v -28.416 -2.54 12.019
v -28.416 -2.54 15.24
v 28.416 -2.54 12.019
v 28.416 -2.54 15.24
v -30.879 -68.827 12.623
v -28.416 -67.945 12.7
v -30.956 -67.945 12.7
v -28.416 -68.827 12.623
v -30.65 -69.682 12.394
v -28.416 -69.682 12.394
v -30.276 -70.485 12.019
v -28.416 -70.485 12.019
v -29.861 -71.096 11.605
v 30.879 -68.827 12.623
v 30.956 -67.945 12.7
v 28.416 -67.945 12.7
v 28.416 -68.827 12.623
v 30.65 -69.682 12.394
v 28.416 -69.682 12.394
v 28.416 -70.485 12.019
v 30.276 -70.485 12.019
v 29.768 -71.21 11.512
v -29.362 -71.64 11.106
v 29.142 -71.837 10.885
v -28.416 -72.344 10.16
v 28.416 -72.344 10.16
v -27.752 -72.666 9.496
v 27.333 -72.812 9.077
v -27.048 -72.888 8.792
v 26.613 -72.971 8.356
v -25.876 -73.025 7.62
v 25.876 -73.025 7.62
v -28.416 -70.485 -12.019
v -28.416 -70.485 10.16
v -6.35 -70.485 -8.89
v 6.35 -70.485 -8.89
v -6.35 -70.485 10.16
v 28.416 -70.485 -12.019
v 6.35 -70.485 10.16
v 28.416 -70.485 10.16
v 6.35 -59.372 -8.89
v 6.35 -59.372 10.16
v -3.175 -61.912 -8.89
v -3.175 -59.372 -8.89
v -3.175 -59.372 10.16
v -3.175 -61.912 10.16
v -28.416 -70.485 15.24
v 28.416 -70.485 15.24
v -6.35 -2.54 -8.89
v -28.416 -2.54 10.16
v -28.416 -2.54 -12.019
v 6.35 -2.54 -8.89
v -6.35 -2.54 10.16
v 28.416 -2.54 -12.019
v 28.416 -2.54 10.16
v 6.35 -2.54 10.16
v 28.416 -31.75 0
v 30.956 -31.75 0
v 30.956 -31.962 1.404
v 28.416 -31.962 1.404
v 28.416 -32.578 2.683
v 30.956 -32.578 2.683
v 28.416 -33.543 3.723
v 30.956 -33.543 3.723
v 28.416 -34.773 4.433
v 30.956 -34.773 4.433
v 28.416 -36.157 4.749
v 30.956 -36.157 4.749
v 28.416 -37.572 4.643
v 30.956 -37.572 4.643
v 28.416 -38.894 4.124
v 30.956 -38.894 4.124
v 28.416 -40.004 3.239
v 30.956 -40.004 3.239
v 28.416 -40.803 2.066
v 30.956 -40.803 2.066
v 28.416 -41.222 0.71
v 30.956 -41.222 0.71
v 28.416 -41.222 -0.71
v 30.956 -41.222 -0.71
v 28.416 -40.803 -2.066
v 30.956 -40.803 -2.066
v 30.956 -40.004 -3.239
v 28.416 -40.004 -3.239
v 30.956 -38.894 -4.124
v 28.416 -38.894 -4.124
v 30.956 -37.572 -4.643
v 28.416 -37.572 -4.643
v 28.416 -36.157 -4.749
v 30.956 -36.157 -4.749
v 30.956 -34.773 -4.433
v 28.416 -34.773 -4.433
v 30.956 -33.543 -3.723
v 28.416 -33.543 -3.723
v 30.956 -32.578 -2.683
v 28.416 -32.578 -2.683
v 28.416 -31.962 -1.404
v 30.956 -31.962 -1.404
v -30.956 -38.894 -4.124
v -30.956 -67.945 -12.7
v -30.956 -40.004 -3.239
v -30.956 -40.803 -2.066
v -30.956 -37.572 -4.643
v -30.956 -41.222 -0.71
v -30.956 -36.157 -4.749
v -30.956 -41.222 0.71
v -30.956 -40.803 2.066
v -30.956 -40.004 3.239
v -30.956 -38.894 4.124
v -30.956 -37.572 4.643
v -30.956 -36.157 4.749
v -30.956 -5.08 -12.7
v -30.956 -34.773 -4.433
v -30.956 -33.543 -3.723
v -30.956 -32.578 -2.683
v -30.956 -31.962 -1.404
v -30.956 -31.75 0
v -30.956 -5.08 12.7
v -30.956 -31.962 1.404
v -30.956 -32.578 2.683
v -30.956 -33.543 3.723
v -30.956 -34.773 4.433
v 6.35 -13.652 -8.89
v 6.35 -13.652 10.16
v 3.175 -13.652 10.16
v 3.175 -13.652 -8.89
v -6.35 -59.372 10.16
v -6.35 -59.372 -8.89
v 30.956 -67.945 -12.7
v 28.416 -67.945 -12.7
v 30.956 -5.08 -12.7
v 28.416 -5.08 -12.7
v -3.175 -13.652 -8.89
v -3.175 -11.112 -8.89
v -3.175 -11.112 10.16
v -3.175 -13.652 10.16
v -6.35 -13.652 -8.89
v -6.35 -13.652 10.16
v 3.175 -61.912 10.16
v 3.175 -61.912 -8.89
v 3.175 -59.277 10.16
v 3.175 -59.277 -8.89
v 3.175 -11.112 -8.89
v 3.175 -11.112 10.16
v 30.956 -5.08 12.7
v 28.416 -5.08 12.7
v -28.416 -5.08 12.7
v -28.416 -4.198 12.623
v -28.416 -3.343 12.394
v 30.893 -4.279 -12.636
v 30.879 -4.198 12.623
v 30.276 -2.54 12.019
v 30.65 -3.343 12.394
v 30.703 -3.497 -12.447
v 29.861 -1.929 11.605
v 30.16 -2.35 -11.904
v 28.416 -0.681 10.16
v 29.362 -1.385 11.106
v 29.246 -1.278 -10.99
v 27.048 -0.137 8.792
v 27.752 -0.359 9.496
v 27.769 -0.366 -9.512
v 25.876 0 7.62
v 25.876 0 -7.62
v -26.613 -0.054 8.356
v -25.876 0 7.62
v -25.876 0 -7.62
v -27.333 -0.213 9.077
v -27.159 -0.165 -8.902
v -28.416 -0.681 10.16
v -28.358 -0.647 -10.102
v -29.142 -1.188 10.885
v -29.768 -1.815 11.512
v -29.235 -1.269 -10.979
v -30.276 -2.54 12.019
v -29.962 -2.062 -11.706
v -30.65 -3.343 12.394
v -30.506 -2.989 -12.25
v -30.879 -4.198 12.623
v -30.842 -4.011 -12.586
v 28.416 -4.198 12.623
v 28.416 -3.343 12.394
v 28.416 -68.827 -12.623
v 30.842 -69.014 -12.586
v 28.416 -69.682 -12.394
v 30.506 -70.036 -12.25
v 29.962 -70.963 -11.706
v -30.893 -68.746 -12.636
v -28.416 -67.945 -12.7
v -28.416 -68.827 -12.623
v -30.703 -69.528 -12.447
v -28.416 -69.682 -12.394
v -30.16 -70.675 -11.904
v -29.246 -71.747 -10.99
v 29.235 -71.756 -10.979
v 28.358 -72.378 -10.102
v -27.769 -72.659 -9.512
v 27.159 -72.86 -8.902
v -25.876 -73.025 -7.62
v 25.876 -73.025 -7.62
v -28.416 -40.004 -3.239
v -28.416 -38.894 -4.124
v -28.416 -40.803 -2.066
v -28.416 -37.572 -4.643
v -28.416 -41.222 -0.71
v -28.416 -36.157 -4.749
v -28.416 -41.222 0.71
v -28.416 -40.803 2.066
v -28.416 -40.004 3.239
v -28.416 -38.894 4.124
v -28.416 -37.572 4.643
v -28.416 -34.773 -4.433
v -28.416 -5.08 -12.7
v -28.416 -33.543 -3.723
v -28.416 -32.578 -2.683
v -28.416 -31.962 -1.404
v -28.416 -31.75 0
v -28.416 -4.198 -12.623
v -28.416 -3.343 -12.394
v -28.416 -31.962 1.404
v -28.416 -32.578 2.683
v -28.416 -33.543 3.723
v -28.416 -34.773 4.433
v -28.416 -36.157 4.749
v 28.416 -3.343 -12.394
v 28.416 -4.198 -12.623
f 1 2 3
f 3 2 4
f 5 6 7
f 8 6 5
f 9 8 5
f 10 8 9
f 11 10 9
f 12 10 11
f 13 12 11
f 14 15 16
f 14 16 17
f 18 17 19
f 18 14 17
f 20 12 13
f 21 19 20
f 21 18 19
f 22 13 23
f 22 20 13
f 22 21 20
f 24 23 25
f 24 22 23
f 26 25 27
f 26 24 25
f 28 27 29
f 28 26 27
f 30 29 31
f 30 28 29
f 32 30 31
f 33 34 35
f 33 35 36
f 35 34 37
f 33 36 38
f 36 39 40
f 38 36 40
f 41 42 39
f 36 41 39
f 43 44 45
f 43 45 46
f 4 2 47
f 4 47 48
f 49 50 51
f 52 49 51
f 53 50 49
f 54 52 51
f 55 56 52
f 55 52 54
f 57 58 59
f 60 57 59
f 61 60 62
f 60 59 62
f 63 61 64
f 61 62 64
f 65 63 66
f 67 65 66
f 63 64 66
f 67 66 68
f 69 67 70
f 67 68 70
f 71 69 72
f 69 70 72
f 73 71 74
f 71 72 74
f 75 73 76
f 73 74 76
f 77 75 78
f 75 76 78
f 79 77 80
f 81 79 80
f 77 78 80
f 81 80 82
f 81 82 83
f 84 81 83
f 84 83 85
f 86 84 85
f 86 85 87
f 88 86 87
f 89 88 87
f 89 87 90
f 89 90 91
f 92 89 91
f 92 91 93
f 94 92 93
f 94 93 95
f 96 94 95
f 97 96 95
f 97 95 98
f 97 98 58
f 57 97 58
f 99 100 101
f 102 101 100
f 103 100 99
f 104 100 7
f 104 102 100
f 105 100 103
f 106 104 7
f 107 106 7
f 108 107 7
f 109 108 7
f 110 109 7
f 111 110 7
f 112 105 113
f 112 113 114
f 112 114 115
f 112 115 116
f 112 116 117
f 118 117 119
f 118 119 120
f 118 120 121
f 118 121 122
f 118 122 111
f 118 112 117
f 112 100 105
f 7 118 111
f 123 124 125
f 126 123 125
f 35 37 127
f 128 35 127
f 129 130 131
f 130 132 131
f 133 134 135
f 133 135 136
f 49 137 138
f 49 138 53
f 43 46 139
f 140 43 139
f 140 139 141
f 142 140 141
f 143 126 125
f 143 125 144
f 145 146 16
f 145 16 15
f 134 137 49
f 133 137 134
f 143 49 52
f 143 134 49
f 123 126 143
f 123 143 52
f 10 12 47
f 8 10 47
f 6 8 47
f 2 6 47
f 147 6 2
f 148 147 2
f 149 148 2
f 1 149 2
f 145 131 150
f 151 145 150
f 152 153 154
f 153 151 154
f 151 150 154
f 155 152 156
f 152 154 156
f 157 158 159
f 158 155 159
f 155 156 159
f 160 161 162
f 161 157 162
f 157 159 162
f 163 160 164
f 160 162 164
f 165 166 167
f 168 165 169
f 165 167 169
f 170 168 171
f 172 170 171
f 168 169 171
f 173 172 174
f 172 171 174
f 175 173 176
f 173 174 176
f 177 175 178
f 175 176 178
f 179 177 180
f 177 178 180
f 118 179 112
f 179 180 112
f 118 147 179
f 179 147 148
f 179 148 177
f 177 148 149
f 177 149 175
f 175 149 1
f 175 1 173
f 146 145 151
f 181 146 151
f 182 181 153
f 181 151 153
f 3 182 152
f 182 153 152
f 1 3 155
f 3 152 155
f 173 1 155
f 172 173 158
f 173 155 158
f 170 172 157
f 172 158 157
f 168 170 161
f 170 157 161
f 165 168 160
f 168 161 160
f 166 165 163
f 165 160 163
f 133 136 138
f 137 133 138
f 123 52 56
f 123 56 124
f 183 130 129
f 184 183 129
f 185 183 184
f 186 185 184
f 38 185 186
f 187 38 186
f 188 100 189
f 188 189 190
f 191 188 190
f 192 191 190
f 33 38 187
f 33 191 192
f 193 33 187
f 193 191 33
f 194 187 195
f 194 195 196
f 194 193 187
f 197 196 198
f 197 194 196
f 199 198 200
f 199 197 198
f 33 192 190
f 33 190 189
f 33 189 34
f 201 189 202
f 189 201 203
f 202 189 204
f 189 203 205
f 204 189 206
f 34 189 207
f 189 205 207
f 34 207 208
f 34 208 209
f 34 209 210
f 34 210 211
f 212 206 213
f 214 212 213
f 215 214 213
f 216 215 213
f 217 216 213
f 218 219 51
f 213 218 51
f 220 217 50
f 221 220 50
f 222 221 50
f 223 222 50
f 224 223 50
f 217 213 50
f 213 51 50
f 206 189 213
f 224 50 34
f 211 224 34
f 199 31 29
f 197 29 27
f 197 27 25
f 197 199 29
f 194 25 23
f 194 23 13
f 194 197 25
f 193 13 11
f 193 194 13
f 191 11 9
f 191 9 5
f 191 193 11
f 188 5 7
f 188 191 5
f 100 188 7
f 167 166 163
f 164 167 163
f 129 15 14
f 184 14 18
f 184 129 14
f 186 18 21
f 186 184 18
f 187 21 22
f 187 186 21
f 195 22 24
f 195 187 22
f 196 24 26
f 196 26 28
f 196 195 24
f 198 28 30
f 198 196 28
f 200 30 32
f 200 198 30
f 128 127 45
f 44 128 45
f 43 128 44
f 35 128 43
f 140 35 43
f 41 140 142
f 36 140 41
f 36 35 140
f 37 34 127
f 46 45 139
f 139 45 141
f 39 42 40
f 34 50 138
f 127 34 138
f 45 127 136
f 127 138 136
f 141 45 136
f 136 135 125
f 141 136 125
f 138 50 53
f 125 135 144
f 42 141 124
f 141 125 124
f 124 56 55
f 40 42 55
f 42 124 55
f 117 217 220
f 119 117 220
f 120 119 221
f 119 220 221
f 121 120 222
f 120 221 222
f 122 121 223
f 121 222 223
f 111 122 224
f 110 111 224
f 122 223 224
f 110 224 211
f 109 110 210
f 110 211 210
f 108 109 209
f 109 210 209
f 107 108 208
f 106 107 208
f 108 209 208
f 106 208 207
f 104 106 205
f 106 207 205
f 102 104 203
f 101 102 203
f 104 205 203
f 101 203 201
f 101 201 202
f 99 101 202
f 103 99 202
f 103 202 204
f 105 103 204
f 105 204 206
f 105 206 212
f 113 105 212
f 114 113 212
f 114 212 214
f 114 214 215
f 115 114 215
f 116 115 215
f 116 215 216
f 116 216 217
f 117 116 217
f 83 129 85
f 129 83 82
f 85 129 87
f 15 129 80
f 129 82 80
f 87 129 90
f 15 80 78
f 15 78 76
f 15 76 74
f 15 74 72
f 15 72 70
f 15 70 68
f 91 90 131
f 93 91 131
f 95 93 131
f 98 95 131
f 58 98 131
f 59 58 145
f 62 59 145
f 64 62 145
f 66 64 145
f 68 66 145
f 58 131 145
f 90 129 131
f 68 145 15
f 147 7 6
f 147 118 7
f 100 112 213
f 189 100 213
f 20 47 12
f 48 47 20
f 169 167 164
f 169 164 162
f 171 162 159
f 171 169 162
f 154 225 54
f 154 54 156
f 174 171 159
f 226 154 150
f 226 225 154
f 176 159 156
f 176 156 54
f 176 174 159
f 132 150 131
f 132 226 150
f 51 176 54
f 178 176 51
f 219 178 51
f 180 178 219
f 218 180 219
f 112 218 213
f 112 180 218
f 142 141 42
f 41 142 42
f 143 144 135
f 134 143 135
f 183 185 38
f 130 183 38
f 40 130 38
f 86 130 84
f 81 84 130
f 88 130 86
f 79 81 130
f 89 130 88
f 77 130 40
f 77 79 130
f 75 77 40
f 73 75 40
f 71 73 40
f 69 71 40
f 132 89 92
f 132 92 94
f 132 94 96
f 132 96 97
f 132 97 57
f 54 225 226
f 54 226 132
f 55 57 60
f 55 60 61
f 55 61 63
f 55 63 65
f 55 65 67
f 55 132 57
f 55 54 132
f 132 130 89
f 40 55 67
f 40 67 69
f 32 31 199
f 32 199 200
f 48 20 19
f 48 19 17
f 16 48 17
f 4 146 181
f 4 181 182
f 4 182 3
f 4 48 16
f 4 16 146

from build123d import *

# Parameters (mm, degrees)
F0_W         = 61.9125
F0_H         = 25.4
F1_DEPTH     = 73.025
F3_T         = -2.54
F4_W         = 56.8325
F4_H         = 67.945
F5_DEPTH     = 2.54
F6_T1_DEPTH  = 50.8
F6_T3_DEPTH  = 87.3125
F6_T8_DEPTH  = 87.3125
F6_T14_DEPTH = 87.3125
F6_T20_DEPTH = 87.3125
F6_T27_DEPTH = 87.3125
F6_T33_DEPTH = 87.3125
F7_T1_DEPTH  = 50.8
F7_T3_DEPTH  = 87.3125
F7_T8_DEPTH  = 87.3125
F7_T14_DEPTH = 87.3125
F7_T20_DEPTH = 87.3125
F7_T27_DEPTH = 87.3125
F7_T33_DEPTH = 87.3125
F2_R         = 4.7625
F8_DEPTH     = 61.9135
F10_DEPTH    = 19.05


# Not quite as in the source:
# - a fillet or chamfer that OpenCascade refuses, or shapes differently, is made with other operations: its cross-section is extruded or revolved along the edge and cut away or added


with BuildPart() as f1:
    # F0 (on Front) → F1 (new body)
    with BuildSketch(Plane.XZ):
        Rectangle(F0_W, F0_H)
    extrude(amount=F1_DEPTH)

    # F3
    f3_openings = [f1.faces().sort_by_distance(p)[0] for p in [
        (0, -36.5125, -12.7),
    ]]
    offset(amount=F3_T, openings=f3_openings)

    # F4 (on face) → F5 (join)
    with BuildSketch(Plane.XY.offset(12.7)):
        with Locations((0, -36.5125)):
            Rectangle(F4_W, F4_H)
    extrude(amount=F5_DEPTH)

    # F6: fillet of radius 5.08 on 4 edges, made by hand

    # F6_s2 → F6_t1 (cut)
    with BuildSketch(Plane.XY.offset(-25.4)):
        with BuildLine():
            ThreePointArc((-25.87625, 0), (-29.4683524484, -1.4878975516), (-30.95625, -5.08))
            Line((-30.95625, -5.08), (-30.95625, 0))
            Line((-30.95625, 0), (-25.87625, 0))
        make_face()
        with BuildLine():
            ThreePointArc((30.95625, -5.08), (29.4683524484, -1.4878975516), (25.87625, 0))
            Line((25.87625, 0), (30.95625, 0))
            Line((30.95625, 0), (30.95625, -5.08))
        make_face()
    extrude(amount=F6_T1_DEPTH, mode=Mode.SUBTRACT)

    # F6_s4 → F6_t3 (cut)
    with BuildSketch(Plane.YZ.offset(-43.65625)):
        with BuildLine():
            ThreePointArc((0, -7.62), (-1.4878975516, -11.2121024484), (-5.08, -12.7))
            Line((-5.08, -12.7), (0, -12.7))
            Line((0, -12.7), (0, -7.62))
        make_face()
    extrude(amount=F6_T3_DEPTH, mode=Mode.SUBTRACT)


with BuildPart() as f6_tool6:
    # F6_s7 → F6_t8 (new body)
    with BuildSketch(Plane.YZ.offset(43.65625)):
        with BuildLine():
            ThreePointArc((-5.08, 12.7), (-1.4878975516, 11.2121024484), (0, 7.62))
            Line((0, 7.62), (0, 12.7))
            Line((0, 12.7), (-5.08, 12.7))
        make_face()
    extrude(amount=-F6_T8_DEPTH)

    split(bisect_by=Plane.XZ.offset(2.54), keep=Keep.TOP)

    split(bisect_by=Plane.YZ.offset(28.41625), keep=Keep.TOP)


with BuildPart() as f1_1:
    add(f1.part)

    # F6_t5: cut F6_tool6
    add(f6_tool6.part, mode=Mode.SUBTRACT)


with BuildPart() as f6_tool12:
    # F6_s13 → F6_t14 (new body)
    with BuildSketch(Plane.YZ.offset(43.65625)):
        with BuildLine():
            ThreePointArc((-5.08, 12.7), (-1.4878975516, 11.2121024484), (0, 7.62))
            Line((0, 7.62), (0, 12.7))
            Line((0, 12.7), (-5.08, 12.7))
        make_face()
    extrude(amount=-F6_T14_DEPTH)

    split(bisect_by=Plane.XZ.offset(2.54), keep=Keep.BOTTOM)

    split(bisect_by=Plane.YZ.offset(28.41625), keep=Keep.TOP)


with BuildPart() as f1_2:
    add(f1_1.part)

    # F6_t11: cut F6_tool12
    add(f6_tool12.part, mode=Mode.SUBTRACT)


with BuildPart() as f6_tool18:
    # F6_s19 → F6_t20 (new body)
    with BuildSketch(Plane.YZ.offset(43.65625)):
        with BuildLine():
            ThreePointArc((-5.08, 12.7), (-1.4878975516, 11.2121024484), (0, 7.62))
            Line((0, 7.62), (0, 12.7))
            Line((0, 12.7), (-5.08, 12.7))
        make_face()
    extrude(amount=-F6_T20_DEPTH)

    split(bisect_by=Plane.YZ.offset(-28.41625), keep=Keep.TOP)

    split(bisect_by=Plane.XZ.offset(2.54), keep=Keep.BOTTOM)

    split(bisect_by=Plane.YZ.offset(28.41625), keep=Keep.BOTTOM)


with BuildPart() as f1_3:
    add(f1_2.part)

    # F6_t17: cut F6_tool18
    add(f6_tool18.part, mode=Mode.SUBTRACT)


with BuildPart() as f6_tool25:
    # F6_s26 → F6_t27 (new body)
    with BuildSketch(Plane.YZ.offset(43.65625)):
        with BuildLine():
            ThreePointArc((-5.08, 12.7), (-1.4878975516, 11.2121024484), (0, 7.62))
            Line((0, 7.62), (0, 12.7))
            Line((0, 12.7), (-5.08, 12.7))
        make_face()
    extrude(amount=-F6_T27_DEPTH)

    split(bisect_by=Plane.YZ.offset(-28.41625), keep=Keep.BOTTOM)

    split(bisect_by=Plane.XZ.offset(2.54), keep=Keep.TOP)


with BuildPart() as f1_4:
    add(f1_3.part)

    # F6_t24: cut F6_tool25
    add(f6_tool25.part, mode=Mode.SUBTRACT)


with BuildPart() as f6_tool31:
    # F6_s32 → F6_t33 (new body)
    with BuildSketch(Plane.YZ.offset(43.65625)):
        with BuildLine():
            ThreePointArc((-5.08, 12.7), (-1.4878975516, 11.2121024484), (0, 7.62))
            Line((0, 7.62), (0, 12.7))
            Line((0, 12.7), (-5.08, 12.7))
        make_face()
    extrude(amount=-F6_T33_DEPTH)

    split(bisect_by=Plane.YZ.offset(-28.41625), keep=Keep.BOTTOM)

    split(bisect_by=Plane.XZ.offset(2.54), keep=Keep.BOTTOM)


with BuildPart() as f1_5:
    add(f1_4.part)

    # F6_t30: cut F6_tool31
    add(f6_tool31.part, mode=Mode.SUBTRACT)

    # F7: fillet of radius 5.08 on 4 edges, made by hand

    # F7_s2 → F7_t1 (cut)
    with BuildSketch(Plane.XY.offset(-25.4)):
        with BuildLine():
            ThreePointArc((-25.87625, -73.025), (-29.4683524484, -71.5371024484), (-30.95625, -67.945))
            Line((-30.95625, -67.945), (-30.95625, -73.025))
            Line((-30.95625, -73.025), (-25.87625, -73.025))
        make_face()
        with BuildLine():
            ThreePointArc((30.95625, -67.945), (29.4683524484, -71.5371024484), (25.87625, -73.025))
            Line((25.87625, -73.025), (30.95625, -73.025))
            Line((30.95625, -73.025), (30.95625, -67.945))
        make_face()
    extrude(amount=F7_T1_DEPTH, mode=Mode.SUBTRACT)

    # F7_s4 → F7_t3 (cut)
    with BuildSketch(Plane.YZ.offset(-43.65625)):
        with BuildLine():
            ThreePointArc((-67.945, -12.7), (-71.5371024484, -11.2121024484), (-73.025, -7.62))
            Line((-73.025, -7.62), (-73.025, -12.7))
            Line((-73.025, -12.7), (-67.945, -12.7))
        make_face()
    extrude(amount=F7_T3_DEPTH, mode=Mode.SUBTRACT)


with BuildPart() as f7_tool6:
    # F7_s7 → F7_t8 (new body)
    with BuildSketch(Plane.YZ.offset(43.65625)):
        with BuildLine():
            ThreePointArc((-67.945, 12.7), (-71.5371024484, 11.2121024484), (-73.025, 7.62))
            Line((-73.025, 7.62), (-73.025, 12.7))
            Line((-73.025, 12.7), (-67.945, 12.7))
        make_face()
    extrude(amount=-F7_T8_DEPTH)

    split(bisect_by=Plane.YZ.offset(28.41625), keep=Keep.TOP)

    split(bisect_by=Plane.XZ.offset(70.485), keep=Keep.BOTTOM)


with BuildPart() as f1_6:
    add(f1_5.part)

    # F7_t5: cut F7_tool6
    add(f7_tool6.part, mode=Mode.SUBTRACT)


with BuildPart() as f7_tool12:
    # F7_s13 → F7_t14 (new body)
    with BuildSketch(Plane.YZ.offset(43.65625)):
        with BuildLine():
            ThreePointArc((-67.945, 12.7), (-71.5371024484, 11.2121024484), (-73.025, 7.62))
            Line((-73.025, 7.62), (-73.025, 12.7))
            Line((-73.025, 12.7), (-67.945, 12.7))
        make_face()
    extrude(amount=-F7_T14_DEPTH)

    split(bisect_by=Plane.YZ.offset(28.41625), keep=Keep.TOP)

    split(bisect_by=Plane.XZ.offset(70.485), keep=Keep.TOP)


with BuildPart() as f1_7:
    add(f1_6.part)

    # F7_t11: cut F7_tool12
    add(f7_tool12.part, mode=Mode.SUBTRACT)


with BuildPart() as f7_tool18:
    # F7_s19 → F7_t20 (new body)
    with BuildSketch(Plane.YZ.offset(43.65625)):
        with BuildLine():
            ThreePointArc((-67.945, 12.7), (-71.5371024484, 11.2121024484), (-73.025, 7.62))
            Line((-73.025, 7.62), (-73.025, 12.7))
            Line((-73.025, 12.7), (-67.945, 12.7))
        make_face()
    extrude(amount=-F7_T20_DEPTH)

    split(bisect_by=Plane.YZ.offset(28.41625), keep=Keep.BOTTOM)

    split(bisect_by=Plane.XZ.offset(70.485), keep=Keep.TOP)

    split(bisect_by=Plane.YZ.offset(-28.41625), keep=Keep.TOP)


with BuildPart() as f1_8:
    add(f1_7.part)

    # F7_t17: cut F7_tool18
    add(f7_tool18.part, mode=Mode.SUBTRACT)


with BuildPart() as f7_tool25:
    # F7_s26 → F7_t27 (new body)
    with BuildSketch(Plane.YZ.offset(43.65625)):
        with BuildLine():
            ThreePointArc((-67.945, 12.7), (-71.5371024484, 11.2121024484), (-73.025, 7.62))
            Line((-73.025, 7.62), (-73.025, 12.7))
            Line((-73.025, 12.7), (-67.945, 12.7))
        make_face()
    extrude(amount=-F7_T27_DEPTH)

    split(bisect_by=Plane.XZ.offset(70.485), keep=Keep.BOTTOM)

    split(bisect_by=Plane.YZ.offset(-28.41625), keep=Keep.BOTTOM)


with BuildPart() as f1_9:
    add(f1_8.part)

    # F7_t24: cut F7_tool25
    add(f7_tool25.part, mode=Mode.SUBTRACT)


with BuildPart() as f7_tool31:
    # F7_s32 → F7_t33 (new body)
    with BuildSketch(Plane.YZ.offset(43.65625)):
        with BuildLine():
            ThreePointArc((-67.945, 12.7), (-71.5371024484, 11.2121024484), (-73.025, 7.62))
            Line((-73.025, 7.62), (-73.025, 12.7))
            Line((-73.025, 12.7), (-67.945, 12.7))
        make_face()
    extrude(amount=-F7_T33_DEPTH)

    split(bisect_by=Plane.XZ.offset(70.485), keep=Keep.TOP)

    split(bisect_by=Plane.YZ.offset(-28.41625), keep=Keep.BOTTOM)


with BuildPart() as f1_10:
    add(f1_9.part)

    # F7_t30: cut F7_tool31
    add(f7_tool31.part, mode=Mode.SUBTRACT)

    # F2 (on face) → F8 (cut, through all)
    with BuildSketch(Plane.YZ.offset(30.95625)):
        with Locations((-36.5125, 0)):
            Circle(F2_R)
    extrude(amount=-F8_DEPTH, mode=Mode.SUBTRACT)

    # F9 (on face) → F10 (join)
    with BuildSketch(Plane(origin=(0, 0, 10.16), x_dir=(1, 0, 0), z_dir=(0, 0, -1))):
        Polygon((-3.175, 61.9125), (3.175, 61.9125), (3.175, 59.2770799994), (6.35, 59.3725), (6.35, 61.9125), (6.35, 70.485), (0, 70.485), (-6.35, 70.485), (-6.35, 61.9125), (-6.35, 59.3725), (-3.175, 59.3725), align=None)
        Polygon((3.175, 13.6525), (3.175, 11.1125), (-3.175, 11.1125), (-3.175, 13.6525), (-6.35, 13.6525), (-6.35, 11.1125), (-6.35, 2.54), (6.35, 2.54), (6.35, 11.1125), (6.35, 13.6525), align=None)
    extrude(amount=F10_DEPTH)


solid = f1_10.part
